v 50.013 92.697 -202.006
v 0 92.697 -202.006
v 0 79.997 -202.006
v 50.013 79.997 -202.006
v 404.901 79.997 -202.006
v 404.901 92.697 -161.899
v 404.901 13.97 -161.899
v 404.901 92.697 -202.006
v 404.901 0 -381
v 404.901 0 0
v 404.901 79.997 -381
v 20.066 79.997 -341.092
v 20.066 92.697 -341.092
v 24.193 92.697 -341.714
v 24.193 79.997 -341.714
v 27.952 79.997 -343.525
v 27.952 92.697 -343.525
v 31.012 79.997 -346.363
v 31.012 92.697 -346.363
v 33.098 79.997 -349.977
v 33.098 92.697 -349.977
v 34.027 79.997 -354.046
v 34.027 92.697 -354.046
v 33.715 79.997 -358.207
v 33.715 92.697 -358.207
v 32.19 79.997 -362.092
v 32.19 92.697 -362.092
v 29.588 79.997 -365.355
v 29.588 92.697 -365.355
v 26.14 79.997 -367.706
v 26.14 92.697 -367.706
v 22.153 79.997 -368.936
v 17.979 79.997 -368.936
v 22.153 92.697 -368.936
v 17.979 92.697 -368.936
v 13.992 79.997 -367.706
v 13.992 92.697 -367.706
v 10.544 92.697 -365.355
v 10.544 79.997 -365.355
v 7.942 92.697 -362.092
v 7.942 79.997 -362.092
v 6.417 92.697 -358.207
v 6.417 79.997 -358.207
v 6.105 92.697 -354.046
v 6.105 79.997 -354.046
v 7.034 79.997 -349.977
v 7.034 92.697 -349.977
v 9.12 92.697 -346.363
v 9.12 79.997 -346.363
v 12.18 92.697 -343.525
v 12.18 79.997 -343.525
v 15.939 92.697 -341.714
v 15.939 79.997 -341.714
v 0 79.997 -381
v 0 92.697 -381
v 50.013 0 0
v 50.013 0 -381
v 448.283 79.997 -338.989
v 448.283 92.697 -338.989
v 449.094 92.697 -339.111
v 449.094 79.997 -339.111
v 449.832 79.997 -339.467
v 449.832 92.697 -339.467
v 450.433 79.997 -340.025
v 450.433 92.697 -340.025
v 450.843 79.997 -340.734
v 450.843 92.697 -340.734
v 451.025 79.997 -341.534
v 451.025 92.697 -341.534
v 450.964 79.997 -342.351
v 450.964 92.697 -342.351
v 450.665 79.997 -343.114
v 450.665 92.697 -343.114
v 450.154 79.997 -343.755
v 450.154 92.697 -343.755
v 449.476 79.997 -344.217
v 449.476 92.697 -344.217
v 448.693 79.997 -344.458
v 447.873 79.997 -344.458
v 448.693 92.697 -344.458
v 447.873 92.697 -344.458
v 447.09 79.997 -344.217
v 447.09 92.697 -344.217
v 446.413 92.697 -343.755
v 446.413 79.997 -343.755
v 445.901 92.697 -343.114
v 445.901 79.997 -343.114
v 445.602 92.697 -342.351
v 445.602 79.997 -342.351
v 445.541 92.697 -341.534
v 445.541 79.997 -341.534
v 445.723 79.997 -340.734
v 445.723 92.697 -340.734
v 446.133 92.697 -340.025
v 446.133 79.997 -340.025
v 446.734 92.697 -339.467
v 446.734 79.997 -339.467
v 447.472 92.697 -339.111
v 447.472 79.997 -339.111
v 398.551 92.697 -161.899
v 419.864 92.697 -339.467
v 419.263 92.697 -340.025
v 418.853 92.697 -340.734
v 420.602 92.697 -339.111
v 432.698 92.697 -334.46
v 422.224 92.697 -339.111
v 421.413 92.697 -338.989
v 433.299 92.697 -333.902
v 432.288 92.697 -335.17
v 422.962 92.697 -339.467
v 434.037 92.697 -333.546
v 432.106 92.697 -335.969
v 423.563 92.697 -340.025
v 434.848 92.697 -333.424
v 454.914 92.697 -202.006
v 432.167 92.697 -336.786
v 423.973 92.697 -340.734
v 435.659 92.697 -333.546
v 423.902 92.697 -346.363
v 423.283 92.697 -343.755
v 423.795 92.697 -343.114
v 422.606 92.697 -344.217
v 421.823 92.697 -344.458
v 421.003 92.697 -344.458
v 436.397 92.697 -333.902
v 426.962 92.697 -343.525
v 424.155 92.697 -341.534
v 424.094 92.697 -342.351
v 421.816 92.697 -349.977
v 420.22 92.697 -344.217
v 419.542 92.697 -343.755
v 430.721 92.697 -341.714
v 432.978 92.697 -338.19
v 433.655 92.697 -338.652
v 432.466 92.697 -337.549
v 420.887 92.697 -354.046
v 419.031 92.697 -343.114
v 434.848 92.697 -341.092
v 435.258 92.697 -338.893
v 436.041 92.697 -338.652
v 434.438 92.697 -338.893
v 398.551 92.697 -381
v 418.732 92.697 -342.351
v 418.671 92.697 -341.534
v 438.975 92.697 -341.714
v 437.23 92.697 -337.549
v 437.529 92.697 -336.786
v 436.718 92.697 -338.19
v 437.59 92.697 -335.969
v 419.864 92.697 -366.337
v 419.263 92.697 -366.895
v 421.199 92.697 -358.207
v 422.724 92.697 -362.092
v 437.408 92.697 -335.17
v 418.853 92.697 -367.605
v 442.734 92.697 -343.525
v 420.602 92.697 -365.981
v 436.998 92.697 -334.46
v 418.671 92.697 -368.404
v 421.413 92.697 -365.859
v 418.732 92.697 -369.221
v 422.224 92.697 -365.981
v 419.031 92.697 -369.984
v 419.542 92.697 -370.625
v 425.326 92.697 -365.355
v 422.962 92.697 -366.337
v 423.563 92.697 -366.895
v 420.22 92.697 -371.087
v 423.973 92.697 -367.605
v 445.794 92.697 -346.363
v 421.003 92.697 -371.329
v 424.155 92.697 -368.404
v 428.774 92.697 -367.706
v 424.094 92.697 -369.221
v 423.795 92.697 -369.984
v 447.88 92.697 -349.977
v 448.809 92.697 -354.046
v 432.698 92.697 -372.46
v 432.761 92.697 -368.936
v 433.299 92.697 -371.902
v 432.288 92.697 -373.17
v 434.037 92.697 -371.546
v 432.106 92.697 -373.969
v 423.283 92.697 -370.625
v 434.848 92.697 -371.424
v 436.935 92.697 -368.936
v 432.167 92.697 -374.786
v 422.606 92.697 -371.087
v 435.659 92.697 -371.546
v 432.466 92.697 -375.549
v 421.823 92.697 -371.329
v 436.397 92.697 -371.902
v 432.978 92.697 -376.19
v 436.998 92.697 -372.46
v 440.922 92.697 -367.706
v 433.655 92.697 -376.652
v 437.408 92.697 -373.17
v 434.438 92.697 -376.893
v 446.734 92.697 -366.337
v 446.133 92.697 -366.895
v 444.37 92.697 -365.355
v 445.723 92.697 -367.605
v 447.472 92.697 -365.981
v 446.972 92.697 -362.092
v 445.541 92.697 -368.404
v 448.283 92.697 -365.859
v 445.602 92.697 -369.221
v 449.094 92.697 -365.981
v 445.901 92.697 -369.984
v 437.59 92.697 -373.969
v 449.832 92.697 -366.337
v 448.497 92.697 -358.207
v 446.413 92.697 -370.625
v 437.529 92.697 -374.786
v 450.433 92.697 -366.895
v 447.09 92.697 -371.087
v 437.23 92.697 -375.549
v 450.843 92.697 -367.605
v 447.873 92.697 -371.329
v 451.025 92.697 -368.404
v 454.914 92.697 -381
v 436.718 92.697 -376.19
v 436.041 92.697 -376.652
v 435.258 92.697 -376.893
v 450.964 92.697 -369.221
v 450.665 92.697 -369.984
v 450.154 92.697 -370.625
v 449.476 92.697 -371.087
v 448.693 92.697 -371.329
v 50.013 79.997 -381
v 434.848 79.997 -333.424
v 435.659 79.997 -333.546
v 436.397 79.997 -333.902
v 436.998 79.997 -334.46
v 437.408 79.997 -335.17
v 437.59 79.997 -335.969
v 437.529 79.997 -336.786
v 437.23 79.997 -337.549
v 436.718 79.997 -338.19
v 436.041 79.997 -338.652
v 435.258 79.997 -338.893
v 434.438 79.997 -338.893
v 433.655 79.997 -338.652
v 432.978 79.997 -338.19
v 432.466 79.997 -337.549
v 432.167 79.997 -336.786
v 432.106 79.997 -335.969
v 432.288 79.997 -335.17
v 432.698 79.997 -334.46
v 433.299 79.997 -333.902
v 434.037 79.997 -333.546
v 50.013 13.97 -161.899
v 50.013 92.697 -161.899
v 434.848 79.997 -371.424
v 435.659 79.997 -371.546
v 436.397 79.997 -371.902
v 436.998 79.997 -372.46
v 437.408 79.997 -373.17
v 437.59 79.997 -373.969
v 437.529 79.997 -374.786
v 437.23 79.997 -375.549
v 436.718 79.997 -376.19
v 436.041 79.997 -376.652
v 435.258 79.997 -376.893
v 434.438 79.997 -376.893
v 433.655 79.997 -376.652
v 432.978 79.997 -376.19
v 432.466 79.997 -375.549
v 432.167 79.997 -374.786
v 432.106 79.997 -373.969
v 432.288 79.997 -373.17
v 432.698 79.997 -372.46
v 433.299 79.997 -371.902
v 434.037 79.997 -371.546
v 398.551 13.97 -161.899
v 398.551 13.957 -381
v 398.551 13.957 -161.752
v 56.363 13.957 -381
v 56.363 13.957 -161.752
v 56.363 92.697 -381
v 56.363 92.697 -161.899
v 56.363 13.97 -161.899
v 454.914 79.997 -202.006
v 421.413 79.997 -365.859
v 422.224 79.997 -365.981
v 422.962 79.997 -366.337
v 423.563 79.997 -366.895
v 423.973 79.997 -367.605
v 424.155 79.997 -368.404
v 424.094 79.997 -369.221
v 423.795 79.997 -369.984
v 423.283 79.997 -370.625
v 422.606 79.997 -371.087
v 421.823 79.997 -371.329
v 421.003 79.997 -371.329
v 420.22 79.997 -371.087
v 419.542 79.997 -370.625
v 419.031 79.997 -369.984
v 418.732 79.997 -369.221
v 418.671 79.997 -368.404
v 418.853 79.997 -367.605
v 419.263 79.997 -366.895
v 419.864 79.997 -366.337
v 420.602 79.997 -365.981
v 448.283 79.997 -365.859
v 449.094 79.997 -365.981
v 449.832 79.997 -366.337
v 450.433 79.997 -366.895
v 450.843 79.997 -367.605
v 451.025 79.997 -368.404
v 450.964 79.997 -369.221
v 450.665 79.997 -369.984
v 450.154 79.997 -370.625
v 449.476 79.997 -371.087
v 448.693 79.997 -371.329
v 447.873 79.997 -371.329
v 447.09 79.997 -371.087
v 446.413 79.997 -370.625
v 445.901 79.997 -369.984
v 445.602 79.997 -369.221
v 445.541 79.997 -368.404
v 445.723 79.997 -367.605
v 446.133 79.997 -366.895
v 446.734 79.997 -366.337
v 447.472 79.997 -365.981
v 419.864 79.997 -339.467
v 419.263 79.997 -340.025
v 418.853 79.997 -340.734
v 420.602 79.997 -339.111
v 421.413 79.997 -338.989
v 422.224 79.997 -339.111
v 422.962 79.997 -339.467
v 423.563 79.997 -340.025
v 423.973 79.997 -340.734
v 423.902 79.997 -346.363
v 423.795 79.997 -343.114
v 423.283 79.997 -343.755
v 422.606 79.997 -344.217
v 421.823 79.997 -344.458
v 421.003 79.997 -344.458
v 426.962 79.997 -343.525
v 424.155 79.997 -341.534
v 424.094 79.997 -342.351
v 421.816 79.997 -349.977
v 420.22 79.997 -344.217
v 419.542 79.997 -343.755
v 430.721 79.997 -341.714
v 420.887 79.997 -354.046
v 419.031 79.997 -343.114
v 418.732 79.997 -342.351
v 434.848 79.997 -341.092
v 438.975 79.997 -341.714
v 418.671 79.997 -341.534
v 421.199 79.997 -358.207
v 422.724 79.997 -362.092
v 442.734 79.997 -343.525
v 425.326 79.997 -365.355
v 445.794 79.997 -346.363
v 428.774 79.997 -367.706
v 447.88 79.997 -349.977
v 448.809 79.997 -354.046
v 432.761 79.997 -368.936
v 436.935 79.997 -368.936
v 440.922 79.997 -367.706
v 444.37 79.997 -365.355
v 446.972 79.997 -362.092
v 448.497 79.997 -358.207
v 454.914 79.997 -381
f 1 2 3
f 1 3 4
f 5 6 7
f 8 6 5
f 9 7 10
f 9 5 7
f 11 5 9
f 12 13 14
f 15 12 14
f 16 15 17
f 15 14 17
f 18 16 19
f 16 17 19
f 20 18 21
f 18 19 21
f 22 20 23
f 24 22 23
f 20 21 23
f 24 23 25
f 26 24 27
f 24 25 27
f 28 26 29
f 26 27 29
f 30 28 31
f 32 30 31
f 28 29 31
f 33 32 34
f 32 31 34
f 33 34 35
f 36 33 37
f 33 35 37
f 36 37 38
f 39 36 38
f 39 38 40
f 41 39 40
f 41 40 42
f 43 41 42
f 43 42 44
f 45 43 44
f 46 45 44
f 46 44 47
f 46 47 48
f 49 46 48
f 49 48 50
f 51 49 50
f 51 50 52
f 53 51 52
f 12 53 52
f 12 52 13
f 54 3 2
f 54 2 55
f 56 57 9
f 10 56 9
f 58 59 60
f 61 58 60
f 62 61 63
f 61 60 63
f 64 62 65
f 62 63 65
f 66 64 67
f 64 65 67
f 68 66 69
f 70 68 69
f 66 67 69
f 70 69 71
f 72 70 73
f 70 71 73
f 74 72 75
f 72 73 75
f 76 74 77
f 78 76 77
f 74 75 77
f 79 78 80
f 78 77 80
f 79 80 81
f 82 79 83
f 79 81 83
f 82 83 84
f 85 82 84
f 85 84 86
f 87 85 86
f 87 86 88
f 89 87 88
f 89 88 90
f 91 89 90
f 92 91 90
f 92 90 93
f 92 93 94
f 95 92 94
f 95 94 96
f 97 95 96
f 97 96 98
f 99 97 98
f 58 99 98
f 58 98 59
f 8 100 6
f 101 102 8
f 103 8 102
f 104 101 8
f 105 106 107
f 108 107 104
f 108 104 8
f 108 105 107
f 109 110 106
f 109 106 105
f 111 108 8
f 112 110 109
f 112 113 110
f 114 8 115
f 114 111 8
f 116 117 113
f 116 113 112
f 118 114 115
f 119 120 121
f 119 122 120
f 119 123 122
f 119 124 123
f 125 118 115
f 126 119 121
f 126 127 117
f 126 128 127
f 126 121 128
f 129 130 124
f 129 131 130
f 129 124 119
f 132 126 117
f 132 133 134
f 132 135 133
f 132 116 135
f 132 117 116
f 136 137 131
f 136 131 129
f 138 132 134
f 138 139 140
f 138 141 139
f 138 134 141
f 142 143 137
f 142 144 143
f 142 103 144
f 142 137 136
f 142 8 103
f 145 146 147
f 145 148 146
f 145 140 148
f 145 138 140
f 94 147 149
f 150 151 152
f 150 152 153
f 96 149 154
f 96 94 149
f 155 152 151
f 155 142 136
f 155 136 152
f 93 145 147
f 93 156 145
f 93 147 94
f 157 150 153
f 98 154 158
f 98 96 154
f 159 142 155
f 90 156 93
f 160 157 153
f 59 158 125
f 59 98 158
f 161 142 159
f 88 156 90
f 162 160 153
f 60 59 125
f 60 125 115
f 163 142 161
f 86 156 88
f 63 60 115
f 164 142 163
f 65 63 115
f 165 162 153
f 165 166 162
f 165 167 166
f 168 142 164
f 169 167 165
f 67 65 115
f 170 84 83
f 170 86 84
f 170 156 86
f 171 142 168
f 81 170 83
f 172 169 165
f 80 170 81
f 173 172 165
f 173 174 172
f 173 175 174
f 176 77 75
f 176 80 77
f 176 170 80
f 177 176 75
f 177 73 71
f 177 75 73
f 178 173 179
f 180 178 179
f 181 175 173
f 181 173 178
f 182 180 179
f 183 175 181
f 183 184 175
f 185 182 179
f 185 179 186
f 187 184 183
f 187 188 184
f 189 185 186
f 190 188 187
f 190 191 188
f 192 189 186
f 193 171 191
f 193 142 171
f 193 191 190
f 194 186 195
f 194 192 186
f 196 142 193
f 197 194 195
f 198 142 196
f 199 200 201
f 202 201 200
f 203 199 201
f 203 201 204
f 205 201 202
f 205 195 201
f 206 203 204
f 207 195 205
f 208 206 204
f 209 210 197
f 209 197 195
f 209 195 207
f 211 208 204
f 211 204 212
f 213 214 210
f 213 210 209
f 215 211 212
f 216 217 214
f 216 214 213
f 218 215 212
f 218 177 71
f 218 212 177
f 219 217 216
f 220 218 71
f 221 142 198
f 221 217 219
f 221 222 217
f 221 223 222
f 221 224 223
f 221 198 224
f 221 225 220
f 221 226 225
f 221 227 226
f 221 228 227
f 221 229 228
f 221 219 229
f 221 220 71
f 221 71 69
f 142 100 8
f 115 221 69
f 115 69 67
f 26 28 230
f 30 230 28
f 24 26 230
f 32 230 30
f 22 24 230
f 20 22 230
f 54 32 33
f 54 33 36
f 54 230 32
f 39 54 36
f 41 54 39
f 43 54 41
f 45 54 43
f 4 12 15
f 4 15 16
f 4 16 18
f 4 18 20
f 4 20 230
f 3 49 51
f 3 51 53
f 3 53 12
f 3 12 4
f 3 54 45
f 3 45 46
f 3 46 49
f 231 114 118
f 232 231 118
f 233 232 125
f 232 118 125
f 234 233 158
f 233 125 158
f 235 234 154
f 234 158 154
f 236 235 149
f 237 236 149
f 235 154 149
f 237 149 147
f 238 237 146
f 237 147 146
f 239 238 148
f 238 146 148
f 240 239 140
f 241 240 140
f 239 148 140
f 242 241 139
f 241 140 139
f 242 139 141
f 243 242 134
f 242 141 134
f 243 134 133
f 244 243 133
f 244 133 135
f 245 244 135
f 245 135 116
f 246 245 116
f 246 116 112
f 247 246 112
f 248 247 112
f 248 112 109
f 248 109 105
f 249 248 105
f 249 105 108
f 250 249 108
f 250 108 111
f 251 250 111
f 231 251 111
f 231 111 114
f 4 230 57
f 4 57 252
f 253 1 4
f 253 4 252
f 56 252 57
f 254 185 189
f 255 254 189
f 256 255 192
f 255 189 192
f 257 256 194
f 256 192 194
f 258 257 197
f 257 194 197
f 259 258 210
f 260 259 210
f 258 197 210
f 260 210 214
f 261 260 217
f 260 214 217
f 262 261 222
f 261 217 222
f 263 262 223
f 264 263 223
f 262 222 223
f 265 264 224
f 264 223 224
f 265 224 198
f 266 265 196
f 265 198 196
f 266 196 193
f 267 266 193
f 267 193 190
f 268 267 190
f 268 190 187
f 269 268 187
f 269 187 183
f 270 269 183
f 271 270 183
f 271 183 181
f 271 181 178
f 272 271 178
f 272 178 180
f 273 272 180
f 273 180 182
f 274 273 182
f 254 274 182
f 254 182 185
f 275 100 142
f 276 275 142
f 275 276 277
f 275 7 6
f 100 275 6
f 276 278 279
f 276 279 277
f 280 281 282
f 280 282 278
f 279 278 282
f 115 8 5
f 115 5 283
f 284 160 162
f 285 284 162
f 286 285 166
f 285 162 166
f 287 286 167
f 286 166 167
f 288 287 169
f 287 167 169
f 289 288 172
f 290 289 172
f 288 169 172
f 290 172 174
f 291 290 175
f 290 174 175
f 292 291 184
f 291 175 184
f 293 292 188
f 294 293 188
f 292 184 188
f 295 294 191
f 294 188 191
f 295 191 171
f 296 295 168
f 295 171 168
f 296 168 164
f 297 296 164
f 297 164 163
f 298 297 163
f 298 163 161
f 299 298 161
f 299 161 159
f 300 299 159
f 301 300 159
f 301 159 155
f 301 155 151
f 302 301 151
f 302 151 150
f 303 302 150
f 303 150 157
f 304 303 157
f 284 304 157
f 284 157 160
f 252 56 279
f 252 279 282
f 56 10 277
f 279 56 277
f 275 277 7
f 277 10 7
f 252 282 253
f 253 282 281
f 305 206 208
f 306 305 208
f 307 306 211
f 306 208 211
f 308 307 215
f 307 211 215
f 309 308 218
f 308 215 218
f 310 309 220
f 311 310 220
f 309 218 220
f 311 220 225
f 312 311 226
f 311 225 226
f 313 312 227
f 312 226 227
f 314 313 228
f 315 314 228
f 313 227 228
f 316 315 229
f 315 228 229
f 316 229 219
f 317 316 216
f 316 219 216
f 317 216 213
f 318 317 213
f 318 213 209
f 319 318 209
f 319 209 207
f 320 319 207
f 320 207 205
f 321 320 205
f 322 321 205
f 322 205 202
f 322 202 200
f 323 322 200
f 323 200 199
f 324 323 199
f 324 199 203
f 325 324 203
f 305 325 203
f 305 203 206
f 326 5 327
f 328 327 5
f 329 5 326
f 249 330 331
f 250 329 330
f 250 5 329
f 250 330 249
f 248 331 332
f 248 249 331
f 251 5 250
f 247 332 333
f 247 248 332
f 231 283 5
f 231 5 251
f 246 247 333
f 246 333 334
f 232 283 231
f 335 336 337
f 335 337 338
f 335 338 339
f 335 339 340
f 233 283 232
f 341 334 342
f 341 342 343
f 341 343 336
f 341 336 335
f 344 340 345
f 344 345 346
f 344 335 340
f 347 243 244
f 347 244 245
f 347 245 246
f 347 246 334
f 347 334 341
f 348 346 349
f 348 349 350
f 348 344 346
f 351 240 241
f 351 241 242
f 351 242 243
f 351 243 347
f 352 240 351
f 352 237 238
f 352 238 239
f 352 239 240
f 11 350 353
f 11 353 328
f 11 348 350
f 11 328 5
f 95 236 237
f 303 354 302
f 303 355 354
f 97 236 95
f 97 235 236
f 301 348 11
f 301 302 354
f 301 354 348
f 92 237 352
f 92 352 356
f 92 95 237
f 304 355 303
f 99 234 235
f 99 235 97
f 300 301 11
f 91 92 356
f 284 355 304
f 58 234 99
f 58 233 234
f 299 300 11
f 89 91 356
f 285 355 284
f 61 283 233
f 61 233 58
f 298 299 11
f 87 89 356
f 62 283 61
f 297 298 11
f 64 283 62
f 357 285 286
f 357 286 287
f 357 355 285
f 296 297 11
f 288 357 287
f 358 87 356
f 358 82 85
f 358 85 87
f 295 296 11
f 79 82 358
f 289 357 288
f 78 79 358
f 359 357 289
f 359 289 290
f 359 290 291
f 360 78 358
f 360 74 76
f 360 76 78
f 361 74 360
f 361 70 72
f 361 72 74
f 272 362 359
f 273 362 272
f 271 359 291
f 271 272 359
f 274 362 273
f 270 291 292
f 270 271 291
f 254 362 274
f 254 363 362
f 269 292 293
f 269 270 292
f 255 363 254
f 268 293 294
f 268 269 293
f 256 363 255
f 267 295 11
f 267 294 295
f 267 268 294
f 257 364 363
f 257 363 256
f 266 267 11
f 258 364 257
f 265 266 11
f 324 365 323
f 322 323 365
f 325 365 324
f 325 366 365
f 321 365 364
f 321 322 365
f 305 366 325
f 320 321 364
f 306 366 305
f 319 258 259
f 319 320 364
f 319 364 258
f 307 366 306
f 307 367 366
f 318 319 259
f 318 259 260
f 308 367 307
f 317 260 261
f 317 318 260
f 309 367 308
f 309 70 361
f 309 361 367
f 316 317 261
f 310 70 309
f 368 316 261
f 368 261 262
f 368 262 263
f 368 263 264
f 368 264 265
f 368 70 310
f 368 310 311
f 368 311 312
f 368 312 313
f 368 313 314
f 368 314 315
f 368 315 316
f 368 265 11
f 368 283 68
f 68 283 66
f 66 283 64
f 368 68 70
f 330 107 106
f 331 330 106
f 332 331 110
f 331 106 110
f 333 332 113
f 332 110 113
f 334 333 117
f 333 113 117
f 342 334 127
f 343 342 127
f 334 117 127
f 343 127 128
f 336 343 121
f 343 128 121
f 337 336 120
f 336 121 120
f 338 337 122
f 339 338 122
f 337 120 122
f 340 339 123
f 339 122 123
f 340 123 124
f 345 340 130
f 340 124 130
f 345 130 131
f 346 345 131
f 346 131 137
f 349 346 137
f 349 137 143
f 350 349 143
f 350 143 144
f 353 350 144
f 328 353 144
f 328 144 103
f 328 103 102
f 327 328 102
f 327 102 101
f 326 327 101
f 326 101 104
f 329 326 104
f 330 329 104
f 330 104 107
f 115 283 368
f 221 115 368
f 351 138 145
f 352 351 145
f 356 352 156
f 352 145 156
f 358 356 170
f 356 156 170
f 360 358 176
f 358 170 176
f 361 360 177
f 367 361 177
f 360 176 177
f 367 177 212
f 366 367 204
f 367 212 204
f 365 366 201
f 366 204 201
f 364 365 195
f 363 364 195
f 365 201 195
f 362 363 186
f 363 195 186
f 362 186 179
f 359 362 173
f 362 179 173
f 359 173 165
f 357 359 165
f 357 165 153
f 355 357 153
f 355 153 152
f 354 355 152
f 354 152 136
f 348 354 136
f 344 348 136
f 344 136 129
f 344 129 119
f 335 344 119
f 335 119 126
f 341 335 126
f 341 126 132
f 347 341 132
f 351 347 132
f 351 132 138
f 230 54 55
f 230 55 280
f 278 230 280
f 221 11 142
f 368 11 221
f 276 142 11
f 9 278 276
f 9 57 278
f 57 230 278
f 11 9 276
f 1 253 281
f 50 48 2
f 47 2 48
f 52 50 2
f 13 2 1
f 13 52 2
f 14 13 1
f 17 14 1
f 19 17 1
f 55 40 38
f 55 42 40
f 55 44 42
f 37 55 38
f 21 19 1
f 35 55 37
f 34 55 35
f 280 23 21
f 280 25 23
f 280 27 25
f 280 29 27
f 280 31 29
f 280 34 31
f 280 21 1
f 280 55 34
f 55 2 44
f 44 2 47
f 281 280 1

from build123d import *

# Parameters (mm, degrees)
SKETCH1_W           = 454.914
SKETCH1_H           = 381
BOSS_EXTRUDE1_DEPTH = 92.6973
SKETCH3_W           = 50.0126
SKETCH3_H           = 202.0062
CUT_EXTRUDE1_DEPTH  = 601.583496962
SKETCH4_R           = 14
CUT_EXTRUDE2_DEPTH  = 601.583496962
SKETCH5_W           = 342.1888
SKETCH5_H           = 381
CUT_EXTRUDE3_DEPTH  = 78.74
SKETCH6_W           = 178.9938
SKETCH6_H           = 79.9974
CUT_EXTRUDE4_DEPTH  = 50.0126
SKETCH7_W           = 178.9938
SKETCH7_H           = 79.9974
CUT_EXTRUDE5_DEPTH  = 50.0126
CUT_EXTRUDE6_DEPTH  = 564.647880462
SKETCH11_R          = 2.75
CUT_EXTRUDE7_DEPTH  = 601.583496962


with BuildPart() as part:
    # Sketch1 → Boss-Extrude1 (new body)
    with BuildSketch(Plane(origin=(0, 0, 0), x_dir=(1, 0, 0), z_dir=(0, 1, 0))):
        with Locations((227.457, 190.5)):
            Rectangle(SKETCH1_W, SKETCH1_H)
    extrude(amount=BOSS_EXTRUDE1_DEPTH)

    # Sketch3 → Cut-Extrude1 (cut, through all)
    with BuildSketch(Plane(origin=(0, 92.6973, 0), x_dir=(1, 0, 0), z_dir=(0, 1, 0))):
        with Locations((429.9077, 101.0031)):
            Rectangle(SKETCH3_W, SKETCH3_H)
        with Locations((25.0063, 101.0031)):
            Rectangle(SKETCH3_W, SKETCH3_H)
    extrude(amount=-CUT_EXTRUDE1_DEPTH, mode=Mode.SUBTRACT)

    # Sketch4 → Cut-Extrude2 (cut, through all)
    with BuildSketch(Plane(origin=(0, 92.6973, 0), x_dir=(1, 0, 0), z_dir=(0, 1, 0))):
        with Locations(Location((20.066, 355.092, 0), (0, 0, 270))):
            Circle(SKETCH4_R)
        with Locations(Location((434.848, 355.092, 0), (0, 0, 270))):
            Circle(SKETCH4_R)
    extrude(amount=-CUT_EXTRUDE2_DEPTH, mode=Mode.SUBTRACT)

    # Sketch5 → Cut-Extrude3 (cut)
    with BuildSketch(Plane(origin=(0, 92.6973, 0), x_dir=(1, 0, 0), z_dir=(0, 1, 0))):
        with Locations((227.457, 190.5)):
            Rectangle(SKETCH5_W, SKETCH5_H)
    extrude(amount=-CUT_EXTRUDE3_DEPTH, mode=Mode.SUBTRACT)

    # Sketch6 → Cut-Extrude4 (cut)
    with BuildSketch(Plane(origin=(454.914, 0, 0), x_dir=(0, 0, -1), z_dir=(1, 0, 0))):
        with Locations((291.5031, 39.9987)):
            Rectangle(SKETCH6_W, SKETCH6_H)
    extrude(amount=-CUT_EXTRUDE4_DEPTH, mode=Mode.SUBTRACT)

    # Sketch7 → Cut-Extrude5 (cut)
    with BuildSketch(Plane.ZY):
        with Locations((-291.5031, 39.9987)):
            Rectangle(SKETCH7_W, SKETCH7_H)
    extrude(amount=-CUT_EXTRUDE5_DEPTH, mode=Mode.SUBTRACT)

    # Sketch10 → Cut-Extrude6 (cut, through all)
    with BuildSketch(Plane(origin=(404.9014, 0, 0), x_dir=(0, 0, -1), z_dir=(1, 0, 0))):
        Polygon((0, 0), (161.899498709, 13.97), (161.899498709, 92.6973), (0, 92.6973), align=None)
    extrude(amount=-CUT_EXTRUDE6_DEPTH, mode=Mode.SUBTRACT)

    # Sketch11 → Cut-Extrude7 (cut, through all)
    with BuildSketch(Plane(origin=(0, 92.6973, 0), x_dir=(1, 0, 0), z_dir=(0, 1, 0))):
        with Locations(Location((434.848, 374.174211985, 0), (0, 0, 270))):
            Circle(SKETCH11_R)
        with Locations(Location((448.283028843, 368.609240827, 0), (0, 0, 270))):
            Circle(SKETCH11_R)
        with Locations(Location((421.412971157, 368.609240827, 0), (0, 0, 270))):
            Circle(SKETCH11_R)
        with Locations(Location((448.283028843, 341.739183142, 0), (0, 0, 270))):
            Circle(SKETCH11_R)
        with Locations(Location((434.848, 336.174211985, 0), (0, 0, 270))):
            Circle(SKETCH11_R)
        with Locations(Location((421.412971157, 341.739183142, 0), (0, 0, 270))):
            Circle(SKETCH11_R)
    extrude(amount=-CUT_EXTRUDE7_DEPTH, mode=Mode.SUBTRACT)


solid = part.part
